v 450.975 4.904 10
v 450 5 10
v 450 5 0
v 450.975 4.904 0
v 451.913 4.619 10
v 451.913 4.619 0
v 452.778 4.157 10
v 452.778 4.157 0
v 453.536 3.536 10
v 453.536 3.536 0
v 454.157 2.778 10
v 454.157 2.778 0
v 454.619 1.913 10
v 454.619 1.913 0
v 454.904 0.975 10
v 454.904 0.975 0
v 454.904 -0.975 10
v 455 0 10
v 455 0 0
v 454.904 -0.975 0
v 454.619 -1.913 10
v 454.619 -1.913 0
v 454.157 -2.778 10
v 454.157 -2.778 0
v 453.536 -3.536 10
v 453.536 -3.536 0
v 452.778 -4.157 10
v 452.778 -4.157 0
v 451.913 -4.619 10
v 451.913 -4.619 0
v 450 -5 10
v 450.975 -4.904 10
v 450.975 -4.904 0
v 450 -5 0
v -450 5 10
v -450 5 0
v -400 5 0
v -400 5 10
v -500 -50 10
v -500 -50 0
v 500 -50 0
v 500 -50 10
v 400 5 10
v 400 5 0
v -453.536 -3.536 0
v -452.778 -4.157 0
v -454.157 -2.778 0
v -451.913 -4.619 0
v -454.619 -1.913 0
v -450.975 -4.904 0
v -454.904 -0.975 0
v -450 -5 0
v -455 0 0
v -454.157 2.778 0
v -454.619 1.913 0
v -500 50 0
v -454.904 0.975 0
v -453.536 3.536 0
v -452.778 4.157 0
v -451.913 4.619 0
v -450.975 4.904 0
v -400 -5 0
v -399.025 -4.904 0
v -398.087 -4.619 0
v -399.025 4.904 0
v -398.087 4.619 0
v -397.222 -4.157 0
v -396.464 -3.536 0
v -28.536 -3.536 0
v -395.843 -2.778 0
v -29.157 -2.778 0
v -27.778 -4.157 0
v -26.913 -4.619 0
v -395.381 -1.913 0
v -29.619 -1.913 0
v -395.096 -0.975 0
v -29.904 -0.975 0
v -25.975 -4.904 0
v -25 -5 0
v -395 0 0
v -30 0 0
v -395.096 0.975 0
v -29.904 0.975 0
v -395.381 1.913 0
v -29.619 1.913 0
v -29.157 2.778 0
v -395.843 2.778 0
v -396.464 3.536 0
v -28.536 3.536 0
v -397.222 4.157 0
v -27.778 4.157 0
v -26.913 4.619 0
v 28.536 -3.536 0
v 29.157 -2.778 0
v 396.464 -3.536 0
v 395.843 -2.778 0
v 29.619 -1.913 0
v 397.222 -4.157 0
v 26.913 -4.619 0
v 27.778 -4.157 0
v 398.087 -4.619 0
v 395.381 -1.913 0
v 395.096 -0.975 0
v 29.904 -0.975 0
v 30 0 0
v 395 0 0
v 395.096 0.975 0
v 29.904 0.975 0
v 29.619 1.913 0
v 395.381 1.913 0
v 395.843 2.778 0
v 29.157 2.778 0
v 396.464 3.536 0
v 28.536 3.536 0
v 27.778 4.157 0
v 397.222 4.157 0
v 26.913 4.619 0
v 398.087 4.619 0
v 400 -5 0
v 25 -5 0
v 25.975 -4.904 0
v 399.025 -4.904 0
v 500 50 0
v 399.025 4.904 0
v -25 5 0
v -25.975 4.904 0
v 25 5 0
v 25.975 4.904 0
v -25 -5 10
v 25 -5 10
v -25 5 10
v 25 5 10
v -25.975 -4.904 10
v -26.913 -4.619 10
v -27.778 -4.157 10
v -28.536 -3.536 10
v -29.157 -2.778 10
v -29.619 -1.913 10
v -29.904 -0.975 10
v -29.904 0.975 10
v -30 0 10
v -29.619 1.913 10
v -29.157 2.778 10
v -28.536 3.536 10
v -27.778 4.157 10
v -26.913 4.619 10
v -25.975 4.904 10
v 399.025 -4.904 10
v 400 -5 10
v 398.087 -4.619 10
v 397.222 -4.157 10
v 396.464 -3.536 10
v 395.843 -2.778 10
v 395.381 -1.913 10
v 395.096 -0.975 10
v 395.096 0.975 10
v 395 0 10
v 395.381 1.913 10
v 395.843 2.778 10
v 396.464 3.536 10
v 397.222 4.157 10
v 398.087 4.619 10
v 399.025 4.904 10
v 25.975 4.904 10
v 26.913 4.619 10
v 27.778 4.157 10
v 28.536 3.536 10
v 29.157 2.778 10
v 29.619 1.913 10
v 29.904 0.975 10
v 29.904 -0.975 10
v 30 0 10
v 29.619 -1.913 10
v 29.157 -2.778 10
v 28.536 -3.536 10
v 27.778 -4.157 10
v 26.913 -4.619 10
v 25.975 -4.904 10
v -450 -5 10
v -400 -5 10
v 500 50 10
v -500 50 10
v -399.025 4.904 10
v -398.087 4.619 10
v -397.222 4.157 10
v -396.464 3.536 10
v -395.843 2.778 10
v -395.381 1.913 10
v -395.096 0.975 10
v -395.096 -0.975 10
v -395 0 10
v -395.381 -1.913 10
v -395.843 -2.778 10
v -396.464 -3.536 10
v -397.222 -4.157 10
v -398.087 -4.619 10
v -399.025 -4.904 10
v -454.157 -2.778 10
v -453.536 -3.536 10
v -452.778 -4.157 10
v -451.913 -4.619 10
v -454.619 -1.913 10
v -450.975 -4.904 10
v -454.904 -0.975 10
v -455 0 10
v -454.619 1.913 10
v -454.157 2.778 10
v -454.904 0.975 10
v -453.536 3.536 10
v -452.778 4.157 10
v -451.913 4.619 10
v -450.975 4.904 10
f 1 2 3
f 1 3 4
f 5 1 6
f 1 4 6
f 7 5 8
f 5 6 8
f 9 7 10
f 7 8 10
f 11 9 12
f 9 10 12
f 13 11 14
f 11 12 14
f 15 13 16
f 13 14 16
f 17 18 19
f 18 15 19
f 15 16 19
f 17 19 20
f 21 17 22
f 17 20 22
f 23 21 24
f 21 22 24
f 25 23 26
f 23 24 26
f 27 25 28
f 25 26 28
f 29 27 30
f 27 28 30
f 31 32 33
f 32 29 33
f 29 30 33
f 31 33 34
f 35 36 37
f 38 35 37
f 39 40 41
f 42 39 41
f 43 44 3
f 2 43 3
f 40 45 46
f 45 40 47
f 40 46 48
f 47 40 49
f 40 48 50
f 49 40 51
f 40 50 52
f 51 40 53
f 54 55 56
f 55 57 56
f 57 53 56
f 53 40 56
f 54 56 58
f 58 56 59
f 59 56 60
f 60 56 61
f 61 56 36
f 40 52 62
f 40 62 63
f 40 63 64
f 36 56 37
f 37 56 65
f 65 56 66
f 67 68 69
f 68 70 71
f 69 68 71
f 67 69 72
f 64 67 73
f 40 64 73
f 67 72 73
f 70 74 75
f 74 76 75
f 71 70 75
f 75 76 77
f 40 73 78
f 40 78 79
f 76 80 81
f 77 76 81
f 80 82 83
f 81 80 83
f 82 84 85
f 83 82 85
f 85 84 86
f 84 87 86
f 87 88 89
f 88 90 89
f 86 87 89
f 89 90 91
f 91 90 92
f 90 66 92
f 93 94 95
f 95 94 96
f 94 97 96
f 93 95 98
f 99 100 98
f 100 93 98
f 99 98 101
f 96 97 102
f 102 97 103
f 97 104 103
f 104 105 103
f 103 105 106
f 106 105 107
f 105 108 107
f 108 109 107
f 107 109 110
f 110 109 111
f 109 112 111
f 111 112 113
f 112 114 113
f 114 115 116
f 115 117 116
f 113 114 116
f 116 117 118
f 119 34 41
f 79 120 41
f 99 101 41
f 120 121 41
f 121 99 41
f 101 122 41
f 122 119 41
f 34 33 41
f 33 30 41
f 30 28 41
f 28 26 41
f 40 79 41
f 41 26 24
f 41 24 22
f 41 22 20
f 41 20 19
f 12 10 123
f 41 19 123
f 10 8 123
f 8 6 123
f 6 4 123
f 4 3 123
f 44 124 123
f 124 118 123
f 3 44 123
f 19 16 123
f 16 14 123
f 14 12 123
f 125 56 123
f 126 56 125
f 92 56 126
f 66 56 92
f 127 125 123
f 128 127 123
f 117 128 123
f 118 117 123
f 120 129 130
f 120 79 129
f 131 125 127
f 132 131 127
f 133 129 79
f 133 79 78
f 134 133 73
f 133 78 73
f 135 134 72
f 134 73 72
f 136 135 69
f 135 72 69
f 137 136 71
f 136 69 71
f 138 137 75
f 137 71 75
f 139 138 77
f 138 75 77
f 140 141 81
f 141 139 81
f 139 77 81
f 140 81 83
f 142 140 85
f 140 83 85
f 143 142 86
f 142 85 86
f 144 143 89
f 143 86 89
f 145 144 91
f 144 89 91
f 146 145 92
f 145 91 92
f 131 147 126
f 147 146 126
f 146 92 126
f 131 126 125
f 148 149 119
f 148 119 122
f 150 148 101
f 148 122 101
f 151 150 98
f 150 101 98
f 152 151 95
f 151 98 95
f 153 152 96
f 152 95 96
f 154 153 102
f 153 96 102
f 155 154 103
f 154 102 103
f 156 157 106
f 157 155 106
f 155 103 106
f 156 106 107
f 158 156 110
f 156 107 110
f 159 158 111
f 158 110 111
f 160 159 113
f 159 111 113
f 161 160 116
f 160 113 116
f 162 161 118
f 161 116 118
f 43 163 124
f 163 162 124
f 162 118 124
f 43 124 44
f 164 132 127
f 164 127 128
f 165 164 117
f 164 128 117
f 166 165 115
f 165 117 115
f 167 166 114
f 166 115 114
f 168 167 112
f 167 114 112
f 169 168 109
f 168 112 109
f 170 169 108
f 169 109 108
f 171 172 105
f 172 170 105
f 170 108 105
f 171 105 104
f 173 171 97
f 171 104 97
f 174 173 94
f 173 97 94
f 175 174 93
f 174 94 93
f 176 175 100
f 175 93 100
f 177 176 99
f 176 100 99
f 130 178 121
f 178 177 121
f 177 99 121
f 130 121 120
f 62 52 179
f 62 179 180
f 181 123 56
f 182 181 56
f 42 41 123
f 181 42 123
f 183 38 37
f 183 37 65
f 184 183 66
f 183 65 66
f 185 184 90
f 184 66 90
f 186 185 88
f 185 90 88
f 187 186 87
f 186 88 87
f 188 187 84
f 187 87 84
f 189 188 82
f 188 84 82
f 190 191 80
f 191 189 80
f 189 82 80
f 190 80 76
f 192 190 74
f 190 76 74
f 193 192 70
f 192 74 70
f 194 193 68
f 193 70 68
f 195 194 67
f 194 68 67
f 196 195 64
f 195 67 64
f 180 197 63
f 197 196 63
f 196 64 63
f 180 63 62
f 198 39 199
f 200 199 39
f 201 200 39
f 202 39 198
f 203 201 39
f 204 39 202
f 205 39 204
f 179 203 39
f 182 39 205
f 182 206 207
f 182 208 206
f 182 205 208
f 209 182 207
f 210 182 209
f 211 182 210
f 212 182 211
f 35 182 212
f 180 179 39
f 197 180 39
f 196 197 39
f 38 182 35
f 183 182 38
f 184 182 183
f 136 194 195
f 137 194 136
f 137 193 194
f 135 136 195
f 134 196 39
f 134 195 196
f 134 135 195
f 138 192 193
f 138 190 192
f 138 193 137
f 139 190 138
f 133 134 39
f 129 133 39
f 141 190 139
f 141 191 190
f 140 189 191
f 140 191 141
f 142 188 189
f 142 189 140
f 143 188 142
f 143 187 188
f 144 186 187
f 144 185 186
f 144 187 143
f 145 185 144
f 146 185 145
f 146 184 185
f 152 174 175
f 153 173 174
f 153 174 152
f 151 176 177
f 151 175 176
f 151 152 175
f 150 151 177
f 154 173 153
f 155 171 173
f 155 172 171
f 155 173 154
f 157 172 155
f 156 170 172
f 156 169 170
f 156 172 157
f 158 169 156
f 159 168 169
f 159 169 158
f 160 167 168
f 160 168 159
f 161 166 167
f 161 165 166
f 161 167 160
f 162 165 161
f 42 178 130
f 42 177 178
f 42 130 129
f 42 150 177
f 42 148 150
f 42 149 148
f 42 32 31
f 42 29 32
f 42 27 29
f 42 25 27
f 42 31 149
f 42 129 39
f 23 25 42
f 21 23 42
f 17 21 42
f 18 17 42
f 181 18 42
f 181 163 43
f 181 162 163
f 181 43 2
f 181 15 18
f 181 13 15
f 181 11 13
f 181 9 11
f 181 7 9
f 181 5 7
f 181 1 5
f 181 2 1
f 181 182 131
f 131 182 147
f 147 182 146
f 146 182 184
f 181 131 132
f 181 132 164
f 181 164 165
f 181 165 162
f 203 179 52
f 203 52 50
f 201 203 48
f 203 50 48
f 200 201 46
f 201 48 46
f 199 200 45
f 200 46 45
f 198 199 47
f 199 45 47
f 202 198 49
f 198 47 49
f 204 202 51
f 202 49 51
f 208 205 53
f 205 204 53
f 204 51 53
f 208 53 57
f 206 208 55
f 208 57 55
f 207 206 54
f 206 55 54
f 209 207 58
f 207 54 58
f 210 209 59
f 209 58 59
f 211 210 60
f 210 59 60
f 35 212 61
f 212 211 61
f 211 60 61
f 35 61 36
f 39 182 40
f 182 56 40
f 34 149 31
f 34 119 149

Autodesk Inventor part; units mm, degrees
ref_plane "YZ Plane" through (0, 0, 0) normal (1, 0, 0) x (0, 1, 0)
ref_plane "XZ Plane" through (0, 0, 0) normal (0, 1, 0) x (-1, 0, 0)
ref_plane "XY Plane" through (0, 0, 0) normal (0, 0, 1) x (1, 0, 0)
sketch "Sketch1" plane through (0, 0, 0) normal (0, 0, 1) x (1, 0, 0)
  line L0 (500, 50) -> (-500, 50)
  line L1 (-500, 50) -> (-500, -50)
  line L2 (-500, -50) -> (500, -50)
  line L3 (500, -50) -> (500, 50)
  line L4 (500, 50) -> (-500, -50) construction
  line L5 (-500, 50) -> (500, -50) construction
  point P0 (0, 0)
  dimension "d0" = 1000
  dimension "d1" = 100
sketch "Sketch2" plane through (0, 0, 0) normal (0, 0, 1) x (1, 0, 0)
  line L0 (400, 5) -> (450, 5)
  line L1 (400, -5) -> (450, -5)
  arc A0 (400, 5) -> (400, -5) centre (400, 0) ccw
  arc A1 (450, -5) -> (450, 5) centre (450, 0) ccw
  line L2 (-25, 5) -> (25, 5)
  line L3 (-25, -5) -> (25, -5)
  arc A2 (25, -5) -> (25, 5) centre (25, 0) ccw
  arc A3 (-25, 5) -> (-25, -5) centre (-25, 0) ccw
  line L4 (-450, 5) -> (-400, 5)
  line L5 (-450, -5) -> (-400, -5)
  arc A4 (-400, -5) -> (-400, 5) centre (-400, 0) ccw
  arc A5 (-450, 5) -> (-450, -5) centre (-450, 0) ccw
  point P0 (0, 0)
extrude "Extrusion1" add sketch "Sketch1" along normal blind 10
extrude "Extrusion2" cut sketch "Sketch2" along normal blind 10
properties part number "Sides"
